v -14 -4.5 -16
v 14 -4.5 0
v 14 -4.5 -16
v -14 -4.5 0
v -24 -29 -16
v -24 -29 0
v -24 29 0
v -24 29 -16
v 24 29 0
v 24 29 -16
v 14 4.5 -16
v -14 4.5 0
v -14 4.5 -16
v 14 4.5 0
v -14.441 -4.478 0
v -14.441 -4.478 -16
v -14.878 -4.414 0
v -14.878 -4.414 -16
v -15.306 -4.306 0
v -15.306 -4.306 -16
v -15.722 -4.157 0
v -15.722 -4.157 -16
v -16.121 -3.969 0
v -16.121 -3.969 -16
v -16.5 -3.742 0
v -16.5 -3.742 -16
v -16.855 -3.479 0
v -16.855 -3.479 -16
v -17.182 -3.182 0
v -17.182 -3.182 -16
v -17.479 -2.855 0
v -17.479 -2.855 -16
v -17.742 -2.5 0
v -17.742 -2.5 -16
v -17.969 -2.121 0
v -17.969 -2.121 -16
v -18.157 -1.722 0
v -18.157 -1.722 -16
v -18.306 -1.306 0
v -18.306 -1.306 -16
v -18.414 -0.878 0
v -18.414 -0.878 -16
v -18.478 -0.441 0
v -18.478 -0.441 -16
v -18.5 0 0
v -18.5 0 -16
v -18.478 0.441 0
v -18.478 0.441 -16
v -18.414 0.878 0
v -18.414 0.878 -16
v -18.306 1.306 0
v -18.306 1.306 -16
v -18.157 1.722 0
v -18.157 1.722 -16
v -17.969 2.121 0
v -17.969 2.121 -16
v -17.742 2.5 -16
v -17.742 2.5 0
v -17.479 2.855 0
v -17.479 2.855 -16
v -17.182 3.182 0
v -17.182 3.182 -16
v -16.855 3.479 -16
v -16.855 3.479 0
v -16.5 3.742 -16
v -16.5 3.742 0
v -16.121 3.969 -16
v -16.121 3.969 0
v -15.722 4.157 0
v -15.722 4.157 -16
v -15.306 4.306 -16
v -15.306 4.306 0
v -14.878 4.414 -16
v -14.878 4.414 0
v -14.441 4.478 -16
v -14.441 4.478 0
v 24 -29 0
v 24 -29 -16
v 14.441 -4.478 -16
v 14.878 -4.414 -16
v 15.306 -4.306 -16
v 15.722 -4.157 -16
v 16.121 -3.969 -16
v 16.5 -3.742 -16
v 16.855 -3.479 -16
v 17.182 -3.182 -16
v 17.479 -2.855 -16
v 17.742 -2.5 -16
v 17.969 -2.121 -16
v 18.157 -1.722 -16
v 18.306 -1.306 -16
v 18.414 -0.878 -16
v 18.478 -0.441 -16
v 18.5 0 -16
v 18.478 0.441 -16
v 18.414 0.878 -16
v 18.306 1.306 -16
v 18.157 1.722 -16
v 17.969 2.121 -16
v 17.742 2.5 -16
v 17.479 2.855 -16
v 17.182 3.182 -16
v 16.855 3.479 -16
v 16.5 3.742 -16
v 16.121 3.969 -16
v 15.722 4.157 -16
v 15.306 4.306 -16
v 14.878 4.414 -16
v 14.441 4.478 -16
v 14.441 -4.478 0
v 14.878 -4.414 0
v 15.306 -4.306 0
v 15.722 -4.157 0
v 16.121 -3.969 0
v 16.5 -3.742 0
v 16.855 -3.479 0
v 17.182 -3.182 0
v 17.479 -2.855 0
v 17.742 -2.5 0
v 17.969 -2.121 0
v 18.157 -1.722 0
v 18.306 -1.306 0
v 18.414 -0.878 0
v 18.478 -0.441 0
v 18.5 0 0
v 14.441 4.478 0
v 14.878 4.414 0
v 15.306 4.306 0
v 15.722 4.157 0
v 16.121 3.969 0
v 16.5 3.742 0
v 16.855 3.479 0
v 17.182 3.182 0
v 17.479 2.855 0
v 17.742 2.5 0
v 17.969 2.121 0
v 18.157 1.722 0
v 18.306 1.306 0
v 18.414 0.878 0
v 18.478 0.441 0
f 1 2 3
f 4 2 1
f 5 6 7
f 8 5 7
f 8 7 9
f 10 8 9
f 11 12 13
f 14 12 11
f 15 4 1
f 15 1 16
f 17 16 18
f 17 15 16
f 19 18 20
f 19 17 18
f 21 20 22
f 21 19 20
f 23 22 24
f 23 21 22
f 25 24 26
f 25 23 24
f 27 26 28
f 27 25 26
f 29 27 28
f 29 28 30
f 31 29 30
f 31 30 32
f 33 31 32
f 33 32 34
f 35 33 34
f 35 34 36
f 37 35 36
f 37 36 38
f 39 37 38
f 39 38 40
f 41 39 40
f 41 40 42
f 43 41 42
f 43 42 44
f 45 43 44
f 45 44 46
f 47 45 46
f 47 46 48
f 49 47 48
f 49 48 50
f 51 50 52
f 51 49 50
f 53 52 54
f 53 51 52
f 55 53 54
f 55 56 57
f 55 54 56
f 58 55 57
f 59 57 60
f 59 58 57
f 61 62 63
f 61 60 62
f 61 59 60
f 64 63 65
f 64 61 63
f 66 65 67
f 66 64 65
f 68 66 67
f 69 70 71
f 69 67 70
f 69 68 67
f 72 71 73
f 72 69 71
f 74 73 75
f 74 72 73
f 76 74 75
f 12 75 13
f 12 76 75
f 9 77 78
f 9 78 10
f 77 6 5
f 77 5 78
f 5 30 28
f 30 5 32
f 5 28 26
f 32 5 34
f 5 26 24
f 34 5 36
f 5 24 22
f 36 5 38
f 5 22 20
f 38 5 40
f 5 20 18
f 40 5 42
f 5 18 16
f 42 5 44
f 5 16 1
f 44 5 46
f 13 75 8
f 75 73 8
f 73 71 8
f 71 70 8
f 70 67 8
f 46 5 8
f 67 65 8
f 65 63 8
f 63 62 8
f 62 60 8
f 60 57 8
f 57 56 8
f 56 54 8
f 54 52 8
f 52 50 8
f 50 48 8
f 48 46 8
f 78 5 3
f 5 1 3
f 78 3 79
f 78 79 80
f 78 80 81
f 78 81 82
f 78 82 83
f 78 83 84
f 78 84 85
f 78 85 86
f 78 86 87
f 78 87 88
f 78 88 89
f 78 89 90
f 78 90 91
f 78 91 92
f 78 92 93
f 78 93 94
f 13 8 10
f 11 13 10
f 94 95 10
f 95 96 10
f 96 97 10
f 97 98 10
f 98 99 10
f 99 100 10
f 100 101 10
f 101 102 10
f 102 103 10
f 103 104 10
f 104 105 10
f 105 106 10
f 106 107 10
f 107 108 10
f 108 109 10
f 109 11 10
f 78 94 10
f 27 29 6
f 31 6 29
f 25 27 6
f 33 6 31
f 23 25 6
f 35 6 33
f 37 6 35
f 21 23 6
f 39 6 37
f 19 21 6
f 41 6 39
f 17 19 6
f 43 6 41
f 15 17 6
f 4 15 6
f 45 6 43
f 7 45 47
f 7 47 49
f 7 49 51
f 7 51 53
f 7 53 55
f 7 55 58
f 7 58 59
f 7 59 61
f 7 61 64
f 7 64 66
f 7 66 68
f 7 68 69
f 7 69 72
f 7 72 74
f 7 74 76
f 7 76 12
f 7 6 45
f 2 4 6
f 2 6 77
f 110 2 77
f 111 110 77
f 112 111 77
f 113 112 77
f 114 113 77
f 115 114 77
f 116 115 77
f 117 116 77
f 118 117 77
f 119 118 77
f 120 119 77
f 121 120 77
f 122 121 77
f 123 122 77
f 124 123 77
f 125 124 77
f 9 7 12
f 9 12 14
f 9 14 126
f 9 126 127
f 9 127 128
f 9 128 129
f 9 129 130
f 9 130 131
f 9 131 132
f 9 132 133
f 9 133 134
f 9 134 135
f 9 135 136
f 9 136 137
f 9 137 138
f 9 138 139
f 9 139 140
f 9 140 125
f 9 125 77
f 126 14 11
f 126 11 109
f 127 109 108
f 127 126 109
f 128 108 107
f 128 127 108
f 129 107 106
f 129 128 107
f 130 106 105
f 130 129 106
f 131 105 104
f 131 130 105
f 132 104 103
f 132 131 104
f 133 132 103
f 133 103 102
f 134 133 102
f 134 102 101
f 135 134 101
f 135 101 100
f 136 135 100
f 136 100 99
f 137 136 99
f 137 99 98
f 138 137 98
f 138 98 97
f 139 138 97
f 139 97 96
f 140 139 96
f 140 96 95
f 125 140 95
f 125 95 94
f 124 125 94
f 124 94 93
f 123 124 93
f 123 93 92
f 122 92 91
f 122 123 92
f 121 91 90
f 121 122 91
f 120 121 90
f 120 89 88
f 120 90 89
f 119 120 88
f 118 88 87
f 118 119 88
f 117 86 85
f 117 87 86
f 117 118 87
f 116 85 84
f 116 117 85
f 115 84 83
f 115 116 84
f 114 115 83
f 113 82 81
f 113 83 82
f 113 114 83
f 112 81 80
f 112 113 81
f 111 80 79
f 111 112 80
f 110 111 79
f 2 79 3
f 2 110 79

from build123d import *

# Parameters (mm, degrees)
SKETCH_1_W          = 48
SKETCH_1_H          = 58
EXTRUDE_1_DEPTH     = 16
CUT_EXTRUDE_1_DEPTH = 41.902322672


with BuildPart() as part:
    # 草图1 → 凸台-拉伸1 (new body)
    with BuildSketch(Plane.XY):
        Rectangle(SKETCH_1_W, SKETCH_1_H)
    extrude(amount=-EXTRUDE_1_DEPTH)

    # 草图2 → 切除-拉伸1 (cut, through all)
    with BuildSketch(Plane.XY):
        with BuildLine():
            Line((-14, 4.5), (14, 4.5))
            ThreePointArc((14, 4.5), (18.5, 0), (14, -4.5))
            Line((14, -4.5), (-14, -4.5))
            ThreePointArc((-14, -4.5), (-18.5, 0), (-14, 4.5))
        make_face()
    extrude(amount=-CUT_EXTRUDE_1_DEPTH, mode=Mode.SUBTRACT)


solid = part.part
